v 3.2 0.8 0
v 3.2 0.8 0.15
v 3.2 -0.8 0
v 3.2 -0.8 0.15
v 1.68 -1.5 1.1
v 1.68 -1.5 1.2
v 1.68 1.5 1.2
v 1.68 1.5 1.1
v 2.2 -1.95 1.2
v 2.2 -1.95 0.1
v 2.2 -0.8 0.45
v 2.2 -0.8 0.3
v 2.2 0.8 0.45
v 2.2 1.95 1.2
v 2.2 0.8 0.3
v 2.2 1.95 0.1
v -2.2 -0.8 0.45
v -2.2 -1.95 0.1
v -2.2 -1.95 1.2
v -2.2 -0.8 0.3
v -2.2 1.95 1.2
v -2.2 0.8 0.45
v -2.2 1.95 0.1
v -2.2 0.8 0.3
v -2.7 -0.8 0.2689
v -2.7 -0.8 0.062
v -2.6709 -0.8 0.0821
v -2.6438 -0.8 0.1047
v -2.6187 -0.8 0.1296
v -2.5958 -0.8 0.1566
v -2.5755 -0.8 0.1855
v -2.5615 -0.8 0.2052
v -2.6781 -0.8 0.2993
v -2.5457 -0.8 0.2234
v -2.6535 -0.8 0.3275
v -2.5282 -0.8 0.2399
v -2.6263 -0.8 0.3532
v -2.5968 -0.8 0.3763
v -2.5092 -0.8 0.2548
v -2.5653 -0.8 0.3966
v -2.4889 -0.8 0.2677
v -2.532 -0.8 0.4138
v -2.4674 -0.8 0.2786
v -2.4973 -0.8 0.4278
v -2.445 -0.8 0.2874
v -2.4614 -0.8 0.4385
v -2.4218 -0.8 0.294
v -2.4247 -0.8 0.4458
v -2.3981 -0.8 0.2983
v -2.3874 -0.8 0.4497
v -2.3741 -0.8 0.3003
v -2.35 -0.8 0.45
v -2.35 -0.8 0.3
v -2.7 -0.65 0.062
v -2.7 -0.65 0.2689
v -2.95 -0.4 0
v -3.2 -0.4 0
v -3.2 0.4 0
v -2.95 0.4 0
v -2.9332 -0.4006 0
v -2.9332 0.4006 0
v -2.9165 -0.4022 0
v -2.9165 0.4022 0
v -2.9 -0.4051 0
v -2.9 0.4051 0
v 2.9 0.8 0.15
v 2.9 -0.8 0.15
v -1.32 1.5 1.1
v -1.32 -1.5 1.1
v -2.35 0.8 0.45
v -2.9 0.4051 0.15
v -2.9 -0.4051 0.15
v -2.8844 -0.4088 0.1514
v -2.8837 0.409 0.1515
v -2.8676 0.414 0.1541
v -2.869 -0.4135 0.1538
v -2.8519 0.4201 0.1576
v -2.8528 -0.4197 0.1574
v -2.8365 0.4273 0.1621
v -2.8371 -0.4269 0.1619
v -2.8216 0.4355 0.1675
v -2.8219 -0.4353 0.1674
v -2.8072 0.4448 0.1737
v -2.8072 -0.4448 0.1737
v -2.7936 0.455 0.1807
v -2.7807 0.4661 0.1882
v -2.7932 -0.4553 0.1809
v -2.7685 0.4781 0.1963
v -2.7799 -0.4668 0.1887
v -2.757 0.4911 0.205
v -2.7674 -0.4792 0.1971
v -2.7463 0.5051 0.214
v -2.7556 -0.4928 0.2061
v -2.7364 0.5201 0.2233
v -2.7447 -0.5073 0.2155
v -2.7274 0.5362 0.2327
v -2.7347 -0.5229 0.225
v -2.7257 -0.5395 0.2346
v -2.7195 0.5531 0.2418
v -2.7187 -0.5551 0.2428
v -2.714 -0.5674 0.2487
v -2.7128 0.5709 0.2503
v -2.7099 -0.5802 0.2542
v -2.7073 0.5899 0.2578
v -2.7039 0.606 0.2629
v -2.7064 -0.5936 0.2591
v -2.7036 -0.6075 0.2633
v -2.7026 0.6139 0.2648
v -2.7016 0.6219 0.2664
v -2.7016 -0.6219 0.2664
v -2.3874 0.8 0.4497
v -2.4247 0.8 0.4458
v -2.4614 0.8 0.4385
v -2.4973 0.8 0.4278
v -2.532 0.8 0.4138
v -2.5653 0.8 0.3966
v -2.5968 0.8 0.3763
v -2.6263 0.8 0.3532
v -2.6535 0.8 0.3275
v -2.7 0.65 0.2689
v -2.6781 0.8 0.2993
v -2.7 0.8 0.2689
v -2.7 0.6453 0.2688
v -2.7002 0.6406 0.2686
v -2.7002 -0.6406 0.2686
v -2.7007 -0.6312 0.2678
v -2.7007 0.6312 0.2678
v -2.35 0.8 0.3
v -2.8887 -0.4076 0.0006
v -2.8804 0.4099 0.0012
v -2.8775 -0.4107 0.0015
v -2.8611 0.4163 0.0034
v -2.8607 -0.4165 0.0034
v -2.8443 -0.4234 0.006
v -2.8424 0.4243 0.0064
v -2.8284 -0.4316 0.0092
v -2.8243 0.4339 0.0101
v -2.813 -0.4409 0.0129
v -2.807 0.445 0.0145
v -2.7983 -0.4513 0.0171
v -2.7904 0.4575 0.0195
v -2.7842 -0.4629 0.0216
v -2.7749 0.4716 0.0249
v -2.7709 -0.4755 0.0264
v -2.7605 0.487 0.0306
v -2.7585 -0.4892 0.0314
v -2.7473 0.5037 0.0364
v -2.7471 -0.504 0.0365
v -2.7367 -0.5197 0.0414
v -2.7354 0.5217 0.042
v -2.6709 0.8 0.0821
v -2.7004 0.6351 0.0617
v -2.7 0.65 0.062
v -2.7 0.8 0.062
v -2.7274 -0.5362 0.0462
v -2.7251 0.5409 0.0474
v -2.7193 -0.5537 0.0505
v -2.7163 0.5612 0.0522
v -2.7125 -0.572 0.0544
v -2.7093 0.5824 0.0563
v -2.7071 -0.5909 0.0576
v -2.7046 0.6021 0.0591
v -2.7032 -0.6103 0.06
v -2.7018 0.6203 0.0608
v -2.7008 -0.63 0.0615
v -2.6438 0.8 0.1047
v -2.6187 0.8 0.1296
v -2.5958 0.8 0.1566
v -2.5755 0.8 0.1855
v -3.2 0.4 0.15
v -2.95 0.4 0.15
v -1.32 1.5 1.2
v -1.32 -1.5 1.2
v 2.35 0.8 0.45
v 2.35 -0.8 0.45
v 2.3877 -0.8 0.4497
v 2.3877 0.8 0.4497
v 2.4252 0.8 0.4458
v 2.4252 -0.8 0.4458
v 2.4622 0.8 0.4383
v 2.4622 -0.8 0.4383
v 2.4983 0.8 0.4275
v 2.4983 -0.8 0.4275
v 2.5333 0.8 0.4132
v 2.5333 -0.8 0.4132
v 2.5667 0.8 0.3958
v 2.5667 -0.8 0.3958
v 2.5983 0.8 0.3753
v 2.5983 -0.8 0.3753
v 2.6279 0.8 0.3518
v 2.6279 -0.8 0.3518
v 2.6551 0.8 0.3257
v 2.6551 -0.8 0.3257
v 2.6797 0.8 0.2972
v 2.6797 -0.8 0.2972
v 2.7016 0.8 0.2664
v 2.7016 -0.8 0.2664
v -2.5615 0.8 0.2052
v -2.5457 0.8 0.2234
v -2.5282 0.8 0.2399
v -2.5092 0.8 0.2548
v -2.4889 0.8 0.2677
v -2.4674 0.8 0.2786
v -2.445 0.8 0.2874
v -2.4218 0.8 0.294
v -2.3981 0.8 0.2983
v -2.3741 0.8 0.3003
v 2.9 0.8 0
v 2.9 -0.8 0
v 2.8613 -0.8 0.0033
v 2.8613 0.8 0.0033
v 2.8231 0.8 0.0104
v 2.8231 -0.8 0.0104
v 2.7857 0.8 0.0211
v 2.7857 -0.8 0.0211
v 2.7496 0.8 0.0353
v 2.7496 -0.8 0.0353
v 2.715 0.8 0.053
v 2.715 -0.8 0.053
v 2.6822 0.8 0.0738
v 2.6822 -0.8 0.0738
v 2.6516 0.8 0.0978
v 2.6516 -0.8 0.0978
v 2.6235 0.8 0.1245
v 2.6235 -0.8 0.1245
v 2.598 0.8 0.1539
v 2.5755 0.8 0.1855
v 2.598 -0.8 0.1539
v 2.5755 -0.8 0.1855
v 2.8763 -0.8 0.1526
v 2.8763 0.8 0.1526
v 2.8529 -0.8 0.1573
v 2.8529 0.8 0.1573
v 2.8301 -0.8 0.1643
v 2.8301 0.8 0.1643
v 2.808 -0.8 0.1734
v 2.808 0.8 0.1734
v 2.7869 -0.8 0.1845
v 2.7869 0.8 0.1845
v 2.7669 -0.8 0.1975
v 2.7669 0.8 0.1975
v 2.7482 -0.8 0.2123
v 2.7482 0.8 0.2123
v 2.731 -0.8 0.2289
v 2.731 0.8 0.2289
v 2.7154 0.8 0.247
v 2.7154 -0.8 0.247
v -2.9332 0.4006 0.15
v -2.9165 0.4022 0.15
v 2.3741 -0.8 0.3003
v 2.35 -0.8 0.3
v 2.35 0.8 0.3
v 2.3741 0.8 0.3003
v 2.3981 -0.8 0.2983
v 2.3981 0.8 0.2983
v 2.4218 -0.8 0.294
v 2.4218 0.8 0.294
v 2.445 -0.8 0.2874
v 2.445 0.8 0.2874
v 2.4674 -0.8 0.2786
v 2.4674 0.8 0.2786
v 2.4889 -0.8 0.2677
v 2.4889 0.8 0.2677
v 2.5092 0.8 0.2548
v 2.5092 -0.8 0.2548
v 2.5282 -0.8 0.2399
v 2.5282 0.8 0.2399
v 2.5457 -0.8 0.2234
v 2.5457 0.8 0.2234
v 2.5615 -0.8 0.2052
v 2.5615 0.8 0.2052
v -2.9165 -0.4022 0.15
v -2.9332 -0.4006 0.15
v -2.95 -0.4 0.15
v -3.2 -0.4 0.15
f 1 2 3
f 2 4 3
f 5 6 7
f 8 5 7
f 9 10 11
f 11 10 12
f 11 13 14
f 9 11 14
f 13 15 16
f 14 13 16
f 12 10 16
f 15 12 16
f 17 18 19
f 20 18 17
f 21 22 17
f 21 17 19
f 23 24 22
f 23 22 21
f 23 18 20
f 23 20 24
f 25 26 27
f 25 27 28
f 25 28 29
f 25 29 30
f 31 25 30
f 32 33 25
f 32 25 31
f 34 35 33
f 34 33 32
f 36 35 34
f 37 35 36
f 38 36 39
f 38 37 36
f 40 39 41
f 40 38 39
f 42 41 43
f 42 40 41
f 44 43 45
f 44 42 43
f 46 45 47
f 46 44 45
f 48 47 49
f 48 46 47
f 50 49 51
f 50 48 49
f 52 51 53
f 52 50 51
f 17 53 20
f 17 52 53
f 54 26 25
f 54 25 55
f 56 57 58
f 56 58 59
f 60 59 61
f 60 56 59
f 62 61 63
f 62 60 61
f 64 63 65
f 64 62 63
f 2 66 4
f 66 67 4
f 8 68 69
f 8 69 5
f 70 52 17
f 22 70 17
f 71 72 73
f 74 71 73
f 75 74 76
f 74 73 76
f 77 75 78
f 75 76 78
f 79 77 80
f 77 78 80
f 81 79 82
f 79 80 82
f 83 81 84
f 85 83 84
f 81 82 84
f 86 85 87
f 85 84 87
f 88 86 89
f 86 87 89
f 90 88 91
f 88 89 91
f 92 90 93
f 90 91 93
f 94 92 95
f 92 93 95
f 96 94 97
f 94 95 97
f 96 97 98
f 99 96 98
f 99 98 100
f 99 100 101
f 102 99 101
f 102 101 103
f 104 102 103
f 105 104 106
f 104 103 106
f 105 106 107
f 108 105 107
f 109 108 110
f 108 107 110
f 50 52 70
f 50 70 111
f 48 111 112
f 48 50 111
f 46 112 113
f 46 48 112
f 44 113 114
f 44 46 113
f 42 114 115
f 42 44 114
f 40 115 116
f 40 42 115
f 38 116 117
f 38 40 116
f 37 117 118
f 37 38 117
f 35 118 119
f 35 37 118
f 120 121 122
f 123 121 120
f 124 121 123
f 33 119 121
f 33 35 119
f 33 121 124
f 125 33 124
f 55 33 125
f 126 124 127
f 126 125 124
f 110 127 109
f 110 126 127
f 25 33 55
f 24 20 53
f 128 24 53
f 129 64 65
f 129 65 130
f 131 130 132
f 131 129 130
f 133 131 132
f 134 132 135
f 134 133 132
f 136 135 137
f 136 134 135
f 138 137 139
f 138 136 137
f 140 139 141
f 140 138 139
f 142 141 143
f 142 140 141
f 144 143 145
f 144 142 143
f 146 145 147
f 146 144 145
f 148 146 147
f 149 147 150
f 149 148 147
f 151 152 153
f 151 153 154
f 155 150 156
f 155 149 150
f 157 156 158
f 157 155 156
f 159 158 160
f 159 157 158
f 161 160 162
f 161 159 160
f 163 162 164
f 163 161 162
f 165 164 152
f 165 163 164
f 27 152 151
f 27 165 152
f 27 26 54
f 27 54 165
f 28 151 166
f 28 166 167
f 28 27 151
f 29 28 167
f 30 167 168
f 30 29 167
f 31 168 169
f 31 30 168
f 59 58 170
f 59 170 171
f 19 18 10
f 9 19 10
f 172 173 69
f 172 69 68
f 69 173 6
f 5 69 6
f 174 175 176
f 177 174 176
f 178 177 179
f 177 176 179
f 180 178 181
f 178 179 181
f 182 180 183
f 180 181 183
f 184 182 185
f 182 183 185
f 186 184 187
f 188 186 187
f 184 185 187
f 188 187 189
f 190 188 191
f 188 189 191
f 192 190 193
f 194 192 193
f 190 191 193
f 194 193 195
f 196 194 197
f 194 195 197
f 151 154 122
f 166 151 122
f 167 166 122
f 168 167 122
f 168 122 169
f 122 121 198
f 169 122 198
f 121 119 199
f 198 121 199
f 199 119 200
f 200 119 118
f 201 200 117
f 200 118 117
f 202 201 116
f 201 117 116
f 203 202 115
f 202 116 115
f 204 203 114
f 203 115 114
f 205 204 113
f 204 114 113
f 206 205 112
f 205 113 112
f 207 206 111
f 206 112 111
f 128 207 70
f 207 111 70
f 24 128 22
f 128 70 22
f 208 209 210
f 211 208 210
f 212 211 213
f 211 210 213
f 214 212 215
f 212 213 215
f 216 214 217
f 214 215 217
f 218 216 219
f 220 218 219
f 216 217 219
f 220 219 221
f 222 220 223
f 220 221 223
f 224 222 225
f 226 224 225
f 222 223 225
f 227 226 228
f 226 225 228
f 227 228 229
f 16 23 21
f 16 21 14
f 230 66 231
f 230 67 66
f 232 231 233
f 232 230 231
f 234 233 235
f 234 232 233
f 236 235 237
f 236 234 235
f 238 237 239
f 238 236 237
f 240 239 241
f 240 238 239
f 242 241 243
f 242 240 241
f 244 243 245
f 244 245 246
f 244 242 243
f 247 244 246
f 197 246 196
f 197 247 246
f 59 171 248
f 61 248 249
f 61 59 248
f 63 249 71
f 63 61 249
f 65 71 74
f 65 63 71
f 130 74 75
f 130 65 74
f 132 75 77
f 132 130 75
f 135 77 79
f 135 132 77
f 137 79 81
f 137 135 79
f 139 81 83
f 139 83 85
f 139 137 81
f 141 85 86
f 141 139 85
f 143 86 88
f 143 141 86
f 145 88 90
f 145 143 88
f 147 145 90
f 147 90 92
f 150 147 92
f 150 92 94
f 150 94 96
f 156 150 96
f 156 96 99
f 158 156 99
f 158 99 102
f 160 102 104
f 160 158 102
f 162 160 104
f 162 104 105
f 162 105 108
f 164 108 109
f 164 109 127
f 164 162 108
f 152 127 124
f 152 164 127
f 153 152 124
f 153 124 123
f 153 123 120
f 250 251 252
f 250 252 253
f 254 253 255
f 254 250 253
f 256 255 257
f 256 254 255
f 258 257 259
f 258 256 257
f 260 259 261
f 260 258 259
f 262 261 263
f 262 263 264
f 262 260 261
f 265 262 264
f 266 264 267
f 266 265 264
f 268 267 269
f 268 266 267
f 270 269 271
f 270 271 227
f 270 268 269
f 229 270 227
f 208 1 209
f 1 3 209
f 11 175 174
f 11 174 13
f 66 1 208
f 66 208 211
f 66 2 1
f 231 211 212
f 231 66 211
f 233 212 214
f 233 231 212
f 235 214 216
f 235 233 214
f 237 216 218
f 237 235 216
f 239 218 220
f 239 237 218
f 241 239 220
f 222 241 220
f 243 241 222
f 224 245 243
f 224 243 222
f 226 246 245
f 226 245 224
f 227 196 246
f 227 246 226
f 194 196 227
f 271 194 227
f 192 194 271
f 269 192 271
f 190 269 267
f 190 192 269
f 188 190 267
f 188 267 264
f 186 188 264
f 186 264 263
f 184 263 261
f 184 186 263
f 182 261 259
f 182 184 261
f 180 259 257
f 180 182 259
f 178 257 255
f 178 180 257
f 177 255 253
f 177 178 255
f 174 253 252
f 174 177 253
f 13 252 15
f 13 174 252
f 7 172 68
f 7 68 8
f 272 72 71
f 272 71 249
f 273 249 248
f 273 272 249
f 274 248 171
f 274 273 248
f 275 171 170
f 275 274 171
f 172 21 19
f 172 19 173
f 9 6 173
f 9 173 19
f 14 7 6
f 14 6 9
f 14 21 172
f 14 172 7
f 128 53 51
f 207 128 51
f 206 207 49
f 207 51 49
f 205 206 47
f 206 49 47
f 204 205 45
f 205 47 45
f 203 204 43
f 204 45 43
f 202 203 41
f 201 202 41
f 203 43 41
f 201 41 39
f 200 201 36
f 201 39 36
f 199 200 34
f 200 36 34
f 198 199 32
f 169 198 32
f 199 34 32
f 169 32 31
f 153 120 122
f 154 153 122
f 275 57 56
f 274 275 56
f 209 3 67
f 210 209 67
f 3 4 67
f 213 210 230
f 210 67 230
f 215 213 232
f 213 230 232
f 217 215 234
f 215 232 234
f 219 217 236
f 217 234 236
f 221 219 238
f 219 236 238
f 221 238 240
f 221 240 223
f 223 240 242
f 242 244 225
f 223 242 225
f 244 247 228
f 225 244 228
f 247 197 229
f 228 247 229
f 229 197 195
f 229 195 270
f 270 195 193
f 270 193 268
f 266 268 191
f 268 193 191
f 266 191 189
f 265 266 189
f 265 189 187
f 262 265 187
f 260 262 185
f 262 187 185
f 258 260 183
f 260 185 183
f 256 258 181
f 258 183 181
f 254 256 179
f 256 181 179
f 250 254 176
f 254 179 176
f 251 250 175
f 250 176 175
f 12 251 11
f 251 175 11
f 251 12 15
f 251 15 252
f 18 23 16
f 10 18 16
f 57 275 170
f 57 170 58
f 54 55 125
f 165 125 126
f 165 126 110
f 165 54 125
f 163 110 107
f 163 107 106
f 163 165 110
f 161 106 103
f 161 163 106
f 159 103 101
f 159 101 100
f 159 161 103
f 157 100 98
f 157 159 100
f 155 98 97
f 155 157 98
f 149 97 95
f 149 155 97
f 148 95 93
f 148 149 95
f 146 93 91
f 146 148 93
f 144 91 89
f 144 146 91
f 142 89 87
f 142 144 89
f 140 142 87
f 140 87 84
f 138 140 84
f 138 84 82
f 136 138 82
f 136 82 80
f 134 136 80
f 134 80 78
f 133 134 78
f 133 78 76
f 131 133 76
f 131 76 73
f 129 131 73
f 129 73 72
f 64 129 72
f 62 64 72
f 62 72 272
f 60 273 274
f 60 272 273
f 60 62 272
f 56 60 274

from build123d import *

# Parameters (mm, degrees)
PAD_START       = 0.1
SKETCH_W        = 4.4
SKETCH_H        = 3.9
PAD_DEPTH       = 1.1
PAD001_DEPTH    = 0.8
POCKET_DEPTH    = 1.201
SKETCH003_W     = 3
SKETCH003_H     = 3
POCKET001_DEPTH = 0.1


with BuildPart() as part:
    # Sketch → Pad (new body)
    with BuildSketch(Plane.XY.offset(PAD_START)):
        Rectangle(SKETCH_W, SKETCH_H)
    extrude(amount=PAD_DEPTH)

    # Sketch001 → Pad001 (join, symmetric)
    with BuildSketch(Plane.XZ):
        with BuildLine():
            Line((-3.2, 0), (-2.9, 0))
            ThreePointArc((-2.9, 0), (-2.714978, 0.052958), (-2.575471, 0.185532))
            ThreePointArc((-2.35, 0.3), (-2.47829, 0.273404), (-2.575471, 0.185532))
            Line((-2.2, 0.3), (-2.35, 0.3))
            Line((-2.2, 0.45), (-2.2, 0.3))
            Line((-2.35, 0.45), (-2.2, 0.45))
            ThreePointArc((-2.35, 0.45), (-2.550176, 0.404908), (-2.701586, 0.26642))
            ThreePointArc((-2.9, 0.15), (-2.78686, 0.184464), (-2.701586, 0.26642))
            Line((-2.9, 0.15), (-3.2, 0.15))
            Line((-3.2, 0.15), (-3.2, 0))
        make_face()
    pad001 = extrude(amount=PAD001_DEPTH, both=True)

    # Mirrored: Pad001 across Sketch001 V_Axis
    add(pad001.mirror(Plane(origin=(0, 0, 0), x_dir=(0, -1, 0), z_dir=(1, 0, 0))))

    # Sketch002 → Pocket (cut, through all)
    with BuildSketch(Plane.XY):
        with BuildLine():
            Line((-5.2, 1.5), (-3.2, 1.5))
            Line((-3.2, 1.5), (-2.7, 1.5))
            Line((-2.7, 0.65), (-2.7, 1.5))
            ThreePointArc((-2.95, 0.4), (-2.773223, 0.473223), (-2.7, 0.65))
            Line((-3.2, 0.4), (-2.95, 0.4))
            Line((-3.2, -0.4), (-3.2, 0.4))
            Line((-3.2, -0.4), (-2.95, -0.4))
            ThreePointArc((-2.7, -0.65), (-2.773223, -0.473223), (-2.95, -0.4))
            Line((-2.7, -1.5), (-2.7, -0.65))
            Line((-2.7, -1.5), (-3.2, -1.5))
            Line((-3.2, -1.5), (-5.2, -1.5))
            Line((-5.2, -1.5), (-5.2, 1.5))
        make_face()
    extrude(amount=POCKET_DEPTH, mode=Mode.SUBTRACT)

    # Sketch003 (on Face5 of Pocket) → Pocket001 (cut)
    with BuildSketch(Plane.XY.offset(1.2)):
        with Locations((0.18, 0)):
            Rectangle(SKETCH003_W, SKETCH003_H)
    extrude(amount=-POCKET001_DEPTH, mode=Mode.SUBTRACT)


solid = part.part
